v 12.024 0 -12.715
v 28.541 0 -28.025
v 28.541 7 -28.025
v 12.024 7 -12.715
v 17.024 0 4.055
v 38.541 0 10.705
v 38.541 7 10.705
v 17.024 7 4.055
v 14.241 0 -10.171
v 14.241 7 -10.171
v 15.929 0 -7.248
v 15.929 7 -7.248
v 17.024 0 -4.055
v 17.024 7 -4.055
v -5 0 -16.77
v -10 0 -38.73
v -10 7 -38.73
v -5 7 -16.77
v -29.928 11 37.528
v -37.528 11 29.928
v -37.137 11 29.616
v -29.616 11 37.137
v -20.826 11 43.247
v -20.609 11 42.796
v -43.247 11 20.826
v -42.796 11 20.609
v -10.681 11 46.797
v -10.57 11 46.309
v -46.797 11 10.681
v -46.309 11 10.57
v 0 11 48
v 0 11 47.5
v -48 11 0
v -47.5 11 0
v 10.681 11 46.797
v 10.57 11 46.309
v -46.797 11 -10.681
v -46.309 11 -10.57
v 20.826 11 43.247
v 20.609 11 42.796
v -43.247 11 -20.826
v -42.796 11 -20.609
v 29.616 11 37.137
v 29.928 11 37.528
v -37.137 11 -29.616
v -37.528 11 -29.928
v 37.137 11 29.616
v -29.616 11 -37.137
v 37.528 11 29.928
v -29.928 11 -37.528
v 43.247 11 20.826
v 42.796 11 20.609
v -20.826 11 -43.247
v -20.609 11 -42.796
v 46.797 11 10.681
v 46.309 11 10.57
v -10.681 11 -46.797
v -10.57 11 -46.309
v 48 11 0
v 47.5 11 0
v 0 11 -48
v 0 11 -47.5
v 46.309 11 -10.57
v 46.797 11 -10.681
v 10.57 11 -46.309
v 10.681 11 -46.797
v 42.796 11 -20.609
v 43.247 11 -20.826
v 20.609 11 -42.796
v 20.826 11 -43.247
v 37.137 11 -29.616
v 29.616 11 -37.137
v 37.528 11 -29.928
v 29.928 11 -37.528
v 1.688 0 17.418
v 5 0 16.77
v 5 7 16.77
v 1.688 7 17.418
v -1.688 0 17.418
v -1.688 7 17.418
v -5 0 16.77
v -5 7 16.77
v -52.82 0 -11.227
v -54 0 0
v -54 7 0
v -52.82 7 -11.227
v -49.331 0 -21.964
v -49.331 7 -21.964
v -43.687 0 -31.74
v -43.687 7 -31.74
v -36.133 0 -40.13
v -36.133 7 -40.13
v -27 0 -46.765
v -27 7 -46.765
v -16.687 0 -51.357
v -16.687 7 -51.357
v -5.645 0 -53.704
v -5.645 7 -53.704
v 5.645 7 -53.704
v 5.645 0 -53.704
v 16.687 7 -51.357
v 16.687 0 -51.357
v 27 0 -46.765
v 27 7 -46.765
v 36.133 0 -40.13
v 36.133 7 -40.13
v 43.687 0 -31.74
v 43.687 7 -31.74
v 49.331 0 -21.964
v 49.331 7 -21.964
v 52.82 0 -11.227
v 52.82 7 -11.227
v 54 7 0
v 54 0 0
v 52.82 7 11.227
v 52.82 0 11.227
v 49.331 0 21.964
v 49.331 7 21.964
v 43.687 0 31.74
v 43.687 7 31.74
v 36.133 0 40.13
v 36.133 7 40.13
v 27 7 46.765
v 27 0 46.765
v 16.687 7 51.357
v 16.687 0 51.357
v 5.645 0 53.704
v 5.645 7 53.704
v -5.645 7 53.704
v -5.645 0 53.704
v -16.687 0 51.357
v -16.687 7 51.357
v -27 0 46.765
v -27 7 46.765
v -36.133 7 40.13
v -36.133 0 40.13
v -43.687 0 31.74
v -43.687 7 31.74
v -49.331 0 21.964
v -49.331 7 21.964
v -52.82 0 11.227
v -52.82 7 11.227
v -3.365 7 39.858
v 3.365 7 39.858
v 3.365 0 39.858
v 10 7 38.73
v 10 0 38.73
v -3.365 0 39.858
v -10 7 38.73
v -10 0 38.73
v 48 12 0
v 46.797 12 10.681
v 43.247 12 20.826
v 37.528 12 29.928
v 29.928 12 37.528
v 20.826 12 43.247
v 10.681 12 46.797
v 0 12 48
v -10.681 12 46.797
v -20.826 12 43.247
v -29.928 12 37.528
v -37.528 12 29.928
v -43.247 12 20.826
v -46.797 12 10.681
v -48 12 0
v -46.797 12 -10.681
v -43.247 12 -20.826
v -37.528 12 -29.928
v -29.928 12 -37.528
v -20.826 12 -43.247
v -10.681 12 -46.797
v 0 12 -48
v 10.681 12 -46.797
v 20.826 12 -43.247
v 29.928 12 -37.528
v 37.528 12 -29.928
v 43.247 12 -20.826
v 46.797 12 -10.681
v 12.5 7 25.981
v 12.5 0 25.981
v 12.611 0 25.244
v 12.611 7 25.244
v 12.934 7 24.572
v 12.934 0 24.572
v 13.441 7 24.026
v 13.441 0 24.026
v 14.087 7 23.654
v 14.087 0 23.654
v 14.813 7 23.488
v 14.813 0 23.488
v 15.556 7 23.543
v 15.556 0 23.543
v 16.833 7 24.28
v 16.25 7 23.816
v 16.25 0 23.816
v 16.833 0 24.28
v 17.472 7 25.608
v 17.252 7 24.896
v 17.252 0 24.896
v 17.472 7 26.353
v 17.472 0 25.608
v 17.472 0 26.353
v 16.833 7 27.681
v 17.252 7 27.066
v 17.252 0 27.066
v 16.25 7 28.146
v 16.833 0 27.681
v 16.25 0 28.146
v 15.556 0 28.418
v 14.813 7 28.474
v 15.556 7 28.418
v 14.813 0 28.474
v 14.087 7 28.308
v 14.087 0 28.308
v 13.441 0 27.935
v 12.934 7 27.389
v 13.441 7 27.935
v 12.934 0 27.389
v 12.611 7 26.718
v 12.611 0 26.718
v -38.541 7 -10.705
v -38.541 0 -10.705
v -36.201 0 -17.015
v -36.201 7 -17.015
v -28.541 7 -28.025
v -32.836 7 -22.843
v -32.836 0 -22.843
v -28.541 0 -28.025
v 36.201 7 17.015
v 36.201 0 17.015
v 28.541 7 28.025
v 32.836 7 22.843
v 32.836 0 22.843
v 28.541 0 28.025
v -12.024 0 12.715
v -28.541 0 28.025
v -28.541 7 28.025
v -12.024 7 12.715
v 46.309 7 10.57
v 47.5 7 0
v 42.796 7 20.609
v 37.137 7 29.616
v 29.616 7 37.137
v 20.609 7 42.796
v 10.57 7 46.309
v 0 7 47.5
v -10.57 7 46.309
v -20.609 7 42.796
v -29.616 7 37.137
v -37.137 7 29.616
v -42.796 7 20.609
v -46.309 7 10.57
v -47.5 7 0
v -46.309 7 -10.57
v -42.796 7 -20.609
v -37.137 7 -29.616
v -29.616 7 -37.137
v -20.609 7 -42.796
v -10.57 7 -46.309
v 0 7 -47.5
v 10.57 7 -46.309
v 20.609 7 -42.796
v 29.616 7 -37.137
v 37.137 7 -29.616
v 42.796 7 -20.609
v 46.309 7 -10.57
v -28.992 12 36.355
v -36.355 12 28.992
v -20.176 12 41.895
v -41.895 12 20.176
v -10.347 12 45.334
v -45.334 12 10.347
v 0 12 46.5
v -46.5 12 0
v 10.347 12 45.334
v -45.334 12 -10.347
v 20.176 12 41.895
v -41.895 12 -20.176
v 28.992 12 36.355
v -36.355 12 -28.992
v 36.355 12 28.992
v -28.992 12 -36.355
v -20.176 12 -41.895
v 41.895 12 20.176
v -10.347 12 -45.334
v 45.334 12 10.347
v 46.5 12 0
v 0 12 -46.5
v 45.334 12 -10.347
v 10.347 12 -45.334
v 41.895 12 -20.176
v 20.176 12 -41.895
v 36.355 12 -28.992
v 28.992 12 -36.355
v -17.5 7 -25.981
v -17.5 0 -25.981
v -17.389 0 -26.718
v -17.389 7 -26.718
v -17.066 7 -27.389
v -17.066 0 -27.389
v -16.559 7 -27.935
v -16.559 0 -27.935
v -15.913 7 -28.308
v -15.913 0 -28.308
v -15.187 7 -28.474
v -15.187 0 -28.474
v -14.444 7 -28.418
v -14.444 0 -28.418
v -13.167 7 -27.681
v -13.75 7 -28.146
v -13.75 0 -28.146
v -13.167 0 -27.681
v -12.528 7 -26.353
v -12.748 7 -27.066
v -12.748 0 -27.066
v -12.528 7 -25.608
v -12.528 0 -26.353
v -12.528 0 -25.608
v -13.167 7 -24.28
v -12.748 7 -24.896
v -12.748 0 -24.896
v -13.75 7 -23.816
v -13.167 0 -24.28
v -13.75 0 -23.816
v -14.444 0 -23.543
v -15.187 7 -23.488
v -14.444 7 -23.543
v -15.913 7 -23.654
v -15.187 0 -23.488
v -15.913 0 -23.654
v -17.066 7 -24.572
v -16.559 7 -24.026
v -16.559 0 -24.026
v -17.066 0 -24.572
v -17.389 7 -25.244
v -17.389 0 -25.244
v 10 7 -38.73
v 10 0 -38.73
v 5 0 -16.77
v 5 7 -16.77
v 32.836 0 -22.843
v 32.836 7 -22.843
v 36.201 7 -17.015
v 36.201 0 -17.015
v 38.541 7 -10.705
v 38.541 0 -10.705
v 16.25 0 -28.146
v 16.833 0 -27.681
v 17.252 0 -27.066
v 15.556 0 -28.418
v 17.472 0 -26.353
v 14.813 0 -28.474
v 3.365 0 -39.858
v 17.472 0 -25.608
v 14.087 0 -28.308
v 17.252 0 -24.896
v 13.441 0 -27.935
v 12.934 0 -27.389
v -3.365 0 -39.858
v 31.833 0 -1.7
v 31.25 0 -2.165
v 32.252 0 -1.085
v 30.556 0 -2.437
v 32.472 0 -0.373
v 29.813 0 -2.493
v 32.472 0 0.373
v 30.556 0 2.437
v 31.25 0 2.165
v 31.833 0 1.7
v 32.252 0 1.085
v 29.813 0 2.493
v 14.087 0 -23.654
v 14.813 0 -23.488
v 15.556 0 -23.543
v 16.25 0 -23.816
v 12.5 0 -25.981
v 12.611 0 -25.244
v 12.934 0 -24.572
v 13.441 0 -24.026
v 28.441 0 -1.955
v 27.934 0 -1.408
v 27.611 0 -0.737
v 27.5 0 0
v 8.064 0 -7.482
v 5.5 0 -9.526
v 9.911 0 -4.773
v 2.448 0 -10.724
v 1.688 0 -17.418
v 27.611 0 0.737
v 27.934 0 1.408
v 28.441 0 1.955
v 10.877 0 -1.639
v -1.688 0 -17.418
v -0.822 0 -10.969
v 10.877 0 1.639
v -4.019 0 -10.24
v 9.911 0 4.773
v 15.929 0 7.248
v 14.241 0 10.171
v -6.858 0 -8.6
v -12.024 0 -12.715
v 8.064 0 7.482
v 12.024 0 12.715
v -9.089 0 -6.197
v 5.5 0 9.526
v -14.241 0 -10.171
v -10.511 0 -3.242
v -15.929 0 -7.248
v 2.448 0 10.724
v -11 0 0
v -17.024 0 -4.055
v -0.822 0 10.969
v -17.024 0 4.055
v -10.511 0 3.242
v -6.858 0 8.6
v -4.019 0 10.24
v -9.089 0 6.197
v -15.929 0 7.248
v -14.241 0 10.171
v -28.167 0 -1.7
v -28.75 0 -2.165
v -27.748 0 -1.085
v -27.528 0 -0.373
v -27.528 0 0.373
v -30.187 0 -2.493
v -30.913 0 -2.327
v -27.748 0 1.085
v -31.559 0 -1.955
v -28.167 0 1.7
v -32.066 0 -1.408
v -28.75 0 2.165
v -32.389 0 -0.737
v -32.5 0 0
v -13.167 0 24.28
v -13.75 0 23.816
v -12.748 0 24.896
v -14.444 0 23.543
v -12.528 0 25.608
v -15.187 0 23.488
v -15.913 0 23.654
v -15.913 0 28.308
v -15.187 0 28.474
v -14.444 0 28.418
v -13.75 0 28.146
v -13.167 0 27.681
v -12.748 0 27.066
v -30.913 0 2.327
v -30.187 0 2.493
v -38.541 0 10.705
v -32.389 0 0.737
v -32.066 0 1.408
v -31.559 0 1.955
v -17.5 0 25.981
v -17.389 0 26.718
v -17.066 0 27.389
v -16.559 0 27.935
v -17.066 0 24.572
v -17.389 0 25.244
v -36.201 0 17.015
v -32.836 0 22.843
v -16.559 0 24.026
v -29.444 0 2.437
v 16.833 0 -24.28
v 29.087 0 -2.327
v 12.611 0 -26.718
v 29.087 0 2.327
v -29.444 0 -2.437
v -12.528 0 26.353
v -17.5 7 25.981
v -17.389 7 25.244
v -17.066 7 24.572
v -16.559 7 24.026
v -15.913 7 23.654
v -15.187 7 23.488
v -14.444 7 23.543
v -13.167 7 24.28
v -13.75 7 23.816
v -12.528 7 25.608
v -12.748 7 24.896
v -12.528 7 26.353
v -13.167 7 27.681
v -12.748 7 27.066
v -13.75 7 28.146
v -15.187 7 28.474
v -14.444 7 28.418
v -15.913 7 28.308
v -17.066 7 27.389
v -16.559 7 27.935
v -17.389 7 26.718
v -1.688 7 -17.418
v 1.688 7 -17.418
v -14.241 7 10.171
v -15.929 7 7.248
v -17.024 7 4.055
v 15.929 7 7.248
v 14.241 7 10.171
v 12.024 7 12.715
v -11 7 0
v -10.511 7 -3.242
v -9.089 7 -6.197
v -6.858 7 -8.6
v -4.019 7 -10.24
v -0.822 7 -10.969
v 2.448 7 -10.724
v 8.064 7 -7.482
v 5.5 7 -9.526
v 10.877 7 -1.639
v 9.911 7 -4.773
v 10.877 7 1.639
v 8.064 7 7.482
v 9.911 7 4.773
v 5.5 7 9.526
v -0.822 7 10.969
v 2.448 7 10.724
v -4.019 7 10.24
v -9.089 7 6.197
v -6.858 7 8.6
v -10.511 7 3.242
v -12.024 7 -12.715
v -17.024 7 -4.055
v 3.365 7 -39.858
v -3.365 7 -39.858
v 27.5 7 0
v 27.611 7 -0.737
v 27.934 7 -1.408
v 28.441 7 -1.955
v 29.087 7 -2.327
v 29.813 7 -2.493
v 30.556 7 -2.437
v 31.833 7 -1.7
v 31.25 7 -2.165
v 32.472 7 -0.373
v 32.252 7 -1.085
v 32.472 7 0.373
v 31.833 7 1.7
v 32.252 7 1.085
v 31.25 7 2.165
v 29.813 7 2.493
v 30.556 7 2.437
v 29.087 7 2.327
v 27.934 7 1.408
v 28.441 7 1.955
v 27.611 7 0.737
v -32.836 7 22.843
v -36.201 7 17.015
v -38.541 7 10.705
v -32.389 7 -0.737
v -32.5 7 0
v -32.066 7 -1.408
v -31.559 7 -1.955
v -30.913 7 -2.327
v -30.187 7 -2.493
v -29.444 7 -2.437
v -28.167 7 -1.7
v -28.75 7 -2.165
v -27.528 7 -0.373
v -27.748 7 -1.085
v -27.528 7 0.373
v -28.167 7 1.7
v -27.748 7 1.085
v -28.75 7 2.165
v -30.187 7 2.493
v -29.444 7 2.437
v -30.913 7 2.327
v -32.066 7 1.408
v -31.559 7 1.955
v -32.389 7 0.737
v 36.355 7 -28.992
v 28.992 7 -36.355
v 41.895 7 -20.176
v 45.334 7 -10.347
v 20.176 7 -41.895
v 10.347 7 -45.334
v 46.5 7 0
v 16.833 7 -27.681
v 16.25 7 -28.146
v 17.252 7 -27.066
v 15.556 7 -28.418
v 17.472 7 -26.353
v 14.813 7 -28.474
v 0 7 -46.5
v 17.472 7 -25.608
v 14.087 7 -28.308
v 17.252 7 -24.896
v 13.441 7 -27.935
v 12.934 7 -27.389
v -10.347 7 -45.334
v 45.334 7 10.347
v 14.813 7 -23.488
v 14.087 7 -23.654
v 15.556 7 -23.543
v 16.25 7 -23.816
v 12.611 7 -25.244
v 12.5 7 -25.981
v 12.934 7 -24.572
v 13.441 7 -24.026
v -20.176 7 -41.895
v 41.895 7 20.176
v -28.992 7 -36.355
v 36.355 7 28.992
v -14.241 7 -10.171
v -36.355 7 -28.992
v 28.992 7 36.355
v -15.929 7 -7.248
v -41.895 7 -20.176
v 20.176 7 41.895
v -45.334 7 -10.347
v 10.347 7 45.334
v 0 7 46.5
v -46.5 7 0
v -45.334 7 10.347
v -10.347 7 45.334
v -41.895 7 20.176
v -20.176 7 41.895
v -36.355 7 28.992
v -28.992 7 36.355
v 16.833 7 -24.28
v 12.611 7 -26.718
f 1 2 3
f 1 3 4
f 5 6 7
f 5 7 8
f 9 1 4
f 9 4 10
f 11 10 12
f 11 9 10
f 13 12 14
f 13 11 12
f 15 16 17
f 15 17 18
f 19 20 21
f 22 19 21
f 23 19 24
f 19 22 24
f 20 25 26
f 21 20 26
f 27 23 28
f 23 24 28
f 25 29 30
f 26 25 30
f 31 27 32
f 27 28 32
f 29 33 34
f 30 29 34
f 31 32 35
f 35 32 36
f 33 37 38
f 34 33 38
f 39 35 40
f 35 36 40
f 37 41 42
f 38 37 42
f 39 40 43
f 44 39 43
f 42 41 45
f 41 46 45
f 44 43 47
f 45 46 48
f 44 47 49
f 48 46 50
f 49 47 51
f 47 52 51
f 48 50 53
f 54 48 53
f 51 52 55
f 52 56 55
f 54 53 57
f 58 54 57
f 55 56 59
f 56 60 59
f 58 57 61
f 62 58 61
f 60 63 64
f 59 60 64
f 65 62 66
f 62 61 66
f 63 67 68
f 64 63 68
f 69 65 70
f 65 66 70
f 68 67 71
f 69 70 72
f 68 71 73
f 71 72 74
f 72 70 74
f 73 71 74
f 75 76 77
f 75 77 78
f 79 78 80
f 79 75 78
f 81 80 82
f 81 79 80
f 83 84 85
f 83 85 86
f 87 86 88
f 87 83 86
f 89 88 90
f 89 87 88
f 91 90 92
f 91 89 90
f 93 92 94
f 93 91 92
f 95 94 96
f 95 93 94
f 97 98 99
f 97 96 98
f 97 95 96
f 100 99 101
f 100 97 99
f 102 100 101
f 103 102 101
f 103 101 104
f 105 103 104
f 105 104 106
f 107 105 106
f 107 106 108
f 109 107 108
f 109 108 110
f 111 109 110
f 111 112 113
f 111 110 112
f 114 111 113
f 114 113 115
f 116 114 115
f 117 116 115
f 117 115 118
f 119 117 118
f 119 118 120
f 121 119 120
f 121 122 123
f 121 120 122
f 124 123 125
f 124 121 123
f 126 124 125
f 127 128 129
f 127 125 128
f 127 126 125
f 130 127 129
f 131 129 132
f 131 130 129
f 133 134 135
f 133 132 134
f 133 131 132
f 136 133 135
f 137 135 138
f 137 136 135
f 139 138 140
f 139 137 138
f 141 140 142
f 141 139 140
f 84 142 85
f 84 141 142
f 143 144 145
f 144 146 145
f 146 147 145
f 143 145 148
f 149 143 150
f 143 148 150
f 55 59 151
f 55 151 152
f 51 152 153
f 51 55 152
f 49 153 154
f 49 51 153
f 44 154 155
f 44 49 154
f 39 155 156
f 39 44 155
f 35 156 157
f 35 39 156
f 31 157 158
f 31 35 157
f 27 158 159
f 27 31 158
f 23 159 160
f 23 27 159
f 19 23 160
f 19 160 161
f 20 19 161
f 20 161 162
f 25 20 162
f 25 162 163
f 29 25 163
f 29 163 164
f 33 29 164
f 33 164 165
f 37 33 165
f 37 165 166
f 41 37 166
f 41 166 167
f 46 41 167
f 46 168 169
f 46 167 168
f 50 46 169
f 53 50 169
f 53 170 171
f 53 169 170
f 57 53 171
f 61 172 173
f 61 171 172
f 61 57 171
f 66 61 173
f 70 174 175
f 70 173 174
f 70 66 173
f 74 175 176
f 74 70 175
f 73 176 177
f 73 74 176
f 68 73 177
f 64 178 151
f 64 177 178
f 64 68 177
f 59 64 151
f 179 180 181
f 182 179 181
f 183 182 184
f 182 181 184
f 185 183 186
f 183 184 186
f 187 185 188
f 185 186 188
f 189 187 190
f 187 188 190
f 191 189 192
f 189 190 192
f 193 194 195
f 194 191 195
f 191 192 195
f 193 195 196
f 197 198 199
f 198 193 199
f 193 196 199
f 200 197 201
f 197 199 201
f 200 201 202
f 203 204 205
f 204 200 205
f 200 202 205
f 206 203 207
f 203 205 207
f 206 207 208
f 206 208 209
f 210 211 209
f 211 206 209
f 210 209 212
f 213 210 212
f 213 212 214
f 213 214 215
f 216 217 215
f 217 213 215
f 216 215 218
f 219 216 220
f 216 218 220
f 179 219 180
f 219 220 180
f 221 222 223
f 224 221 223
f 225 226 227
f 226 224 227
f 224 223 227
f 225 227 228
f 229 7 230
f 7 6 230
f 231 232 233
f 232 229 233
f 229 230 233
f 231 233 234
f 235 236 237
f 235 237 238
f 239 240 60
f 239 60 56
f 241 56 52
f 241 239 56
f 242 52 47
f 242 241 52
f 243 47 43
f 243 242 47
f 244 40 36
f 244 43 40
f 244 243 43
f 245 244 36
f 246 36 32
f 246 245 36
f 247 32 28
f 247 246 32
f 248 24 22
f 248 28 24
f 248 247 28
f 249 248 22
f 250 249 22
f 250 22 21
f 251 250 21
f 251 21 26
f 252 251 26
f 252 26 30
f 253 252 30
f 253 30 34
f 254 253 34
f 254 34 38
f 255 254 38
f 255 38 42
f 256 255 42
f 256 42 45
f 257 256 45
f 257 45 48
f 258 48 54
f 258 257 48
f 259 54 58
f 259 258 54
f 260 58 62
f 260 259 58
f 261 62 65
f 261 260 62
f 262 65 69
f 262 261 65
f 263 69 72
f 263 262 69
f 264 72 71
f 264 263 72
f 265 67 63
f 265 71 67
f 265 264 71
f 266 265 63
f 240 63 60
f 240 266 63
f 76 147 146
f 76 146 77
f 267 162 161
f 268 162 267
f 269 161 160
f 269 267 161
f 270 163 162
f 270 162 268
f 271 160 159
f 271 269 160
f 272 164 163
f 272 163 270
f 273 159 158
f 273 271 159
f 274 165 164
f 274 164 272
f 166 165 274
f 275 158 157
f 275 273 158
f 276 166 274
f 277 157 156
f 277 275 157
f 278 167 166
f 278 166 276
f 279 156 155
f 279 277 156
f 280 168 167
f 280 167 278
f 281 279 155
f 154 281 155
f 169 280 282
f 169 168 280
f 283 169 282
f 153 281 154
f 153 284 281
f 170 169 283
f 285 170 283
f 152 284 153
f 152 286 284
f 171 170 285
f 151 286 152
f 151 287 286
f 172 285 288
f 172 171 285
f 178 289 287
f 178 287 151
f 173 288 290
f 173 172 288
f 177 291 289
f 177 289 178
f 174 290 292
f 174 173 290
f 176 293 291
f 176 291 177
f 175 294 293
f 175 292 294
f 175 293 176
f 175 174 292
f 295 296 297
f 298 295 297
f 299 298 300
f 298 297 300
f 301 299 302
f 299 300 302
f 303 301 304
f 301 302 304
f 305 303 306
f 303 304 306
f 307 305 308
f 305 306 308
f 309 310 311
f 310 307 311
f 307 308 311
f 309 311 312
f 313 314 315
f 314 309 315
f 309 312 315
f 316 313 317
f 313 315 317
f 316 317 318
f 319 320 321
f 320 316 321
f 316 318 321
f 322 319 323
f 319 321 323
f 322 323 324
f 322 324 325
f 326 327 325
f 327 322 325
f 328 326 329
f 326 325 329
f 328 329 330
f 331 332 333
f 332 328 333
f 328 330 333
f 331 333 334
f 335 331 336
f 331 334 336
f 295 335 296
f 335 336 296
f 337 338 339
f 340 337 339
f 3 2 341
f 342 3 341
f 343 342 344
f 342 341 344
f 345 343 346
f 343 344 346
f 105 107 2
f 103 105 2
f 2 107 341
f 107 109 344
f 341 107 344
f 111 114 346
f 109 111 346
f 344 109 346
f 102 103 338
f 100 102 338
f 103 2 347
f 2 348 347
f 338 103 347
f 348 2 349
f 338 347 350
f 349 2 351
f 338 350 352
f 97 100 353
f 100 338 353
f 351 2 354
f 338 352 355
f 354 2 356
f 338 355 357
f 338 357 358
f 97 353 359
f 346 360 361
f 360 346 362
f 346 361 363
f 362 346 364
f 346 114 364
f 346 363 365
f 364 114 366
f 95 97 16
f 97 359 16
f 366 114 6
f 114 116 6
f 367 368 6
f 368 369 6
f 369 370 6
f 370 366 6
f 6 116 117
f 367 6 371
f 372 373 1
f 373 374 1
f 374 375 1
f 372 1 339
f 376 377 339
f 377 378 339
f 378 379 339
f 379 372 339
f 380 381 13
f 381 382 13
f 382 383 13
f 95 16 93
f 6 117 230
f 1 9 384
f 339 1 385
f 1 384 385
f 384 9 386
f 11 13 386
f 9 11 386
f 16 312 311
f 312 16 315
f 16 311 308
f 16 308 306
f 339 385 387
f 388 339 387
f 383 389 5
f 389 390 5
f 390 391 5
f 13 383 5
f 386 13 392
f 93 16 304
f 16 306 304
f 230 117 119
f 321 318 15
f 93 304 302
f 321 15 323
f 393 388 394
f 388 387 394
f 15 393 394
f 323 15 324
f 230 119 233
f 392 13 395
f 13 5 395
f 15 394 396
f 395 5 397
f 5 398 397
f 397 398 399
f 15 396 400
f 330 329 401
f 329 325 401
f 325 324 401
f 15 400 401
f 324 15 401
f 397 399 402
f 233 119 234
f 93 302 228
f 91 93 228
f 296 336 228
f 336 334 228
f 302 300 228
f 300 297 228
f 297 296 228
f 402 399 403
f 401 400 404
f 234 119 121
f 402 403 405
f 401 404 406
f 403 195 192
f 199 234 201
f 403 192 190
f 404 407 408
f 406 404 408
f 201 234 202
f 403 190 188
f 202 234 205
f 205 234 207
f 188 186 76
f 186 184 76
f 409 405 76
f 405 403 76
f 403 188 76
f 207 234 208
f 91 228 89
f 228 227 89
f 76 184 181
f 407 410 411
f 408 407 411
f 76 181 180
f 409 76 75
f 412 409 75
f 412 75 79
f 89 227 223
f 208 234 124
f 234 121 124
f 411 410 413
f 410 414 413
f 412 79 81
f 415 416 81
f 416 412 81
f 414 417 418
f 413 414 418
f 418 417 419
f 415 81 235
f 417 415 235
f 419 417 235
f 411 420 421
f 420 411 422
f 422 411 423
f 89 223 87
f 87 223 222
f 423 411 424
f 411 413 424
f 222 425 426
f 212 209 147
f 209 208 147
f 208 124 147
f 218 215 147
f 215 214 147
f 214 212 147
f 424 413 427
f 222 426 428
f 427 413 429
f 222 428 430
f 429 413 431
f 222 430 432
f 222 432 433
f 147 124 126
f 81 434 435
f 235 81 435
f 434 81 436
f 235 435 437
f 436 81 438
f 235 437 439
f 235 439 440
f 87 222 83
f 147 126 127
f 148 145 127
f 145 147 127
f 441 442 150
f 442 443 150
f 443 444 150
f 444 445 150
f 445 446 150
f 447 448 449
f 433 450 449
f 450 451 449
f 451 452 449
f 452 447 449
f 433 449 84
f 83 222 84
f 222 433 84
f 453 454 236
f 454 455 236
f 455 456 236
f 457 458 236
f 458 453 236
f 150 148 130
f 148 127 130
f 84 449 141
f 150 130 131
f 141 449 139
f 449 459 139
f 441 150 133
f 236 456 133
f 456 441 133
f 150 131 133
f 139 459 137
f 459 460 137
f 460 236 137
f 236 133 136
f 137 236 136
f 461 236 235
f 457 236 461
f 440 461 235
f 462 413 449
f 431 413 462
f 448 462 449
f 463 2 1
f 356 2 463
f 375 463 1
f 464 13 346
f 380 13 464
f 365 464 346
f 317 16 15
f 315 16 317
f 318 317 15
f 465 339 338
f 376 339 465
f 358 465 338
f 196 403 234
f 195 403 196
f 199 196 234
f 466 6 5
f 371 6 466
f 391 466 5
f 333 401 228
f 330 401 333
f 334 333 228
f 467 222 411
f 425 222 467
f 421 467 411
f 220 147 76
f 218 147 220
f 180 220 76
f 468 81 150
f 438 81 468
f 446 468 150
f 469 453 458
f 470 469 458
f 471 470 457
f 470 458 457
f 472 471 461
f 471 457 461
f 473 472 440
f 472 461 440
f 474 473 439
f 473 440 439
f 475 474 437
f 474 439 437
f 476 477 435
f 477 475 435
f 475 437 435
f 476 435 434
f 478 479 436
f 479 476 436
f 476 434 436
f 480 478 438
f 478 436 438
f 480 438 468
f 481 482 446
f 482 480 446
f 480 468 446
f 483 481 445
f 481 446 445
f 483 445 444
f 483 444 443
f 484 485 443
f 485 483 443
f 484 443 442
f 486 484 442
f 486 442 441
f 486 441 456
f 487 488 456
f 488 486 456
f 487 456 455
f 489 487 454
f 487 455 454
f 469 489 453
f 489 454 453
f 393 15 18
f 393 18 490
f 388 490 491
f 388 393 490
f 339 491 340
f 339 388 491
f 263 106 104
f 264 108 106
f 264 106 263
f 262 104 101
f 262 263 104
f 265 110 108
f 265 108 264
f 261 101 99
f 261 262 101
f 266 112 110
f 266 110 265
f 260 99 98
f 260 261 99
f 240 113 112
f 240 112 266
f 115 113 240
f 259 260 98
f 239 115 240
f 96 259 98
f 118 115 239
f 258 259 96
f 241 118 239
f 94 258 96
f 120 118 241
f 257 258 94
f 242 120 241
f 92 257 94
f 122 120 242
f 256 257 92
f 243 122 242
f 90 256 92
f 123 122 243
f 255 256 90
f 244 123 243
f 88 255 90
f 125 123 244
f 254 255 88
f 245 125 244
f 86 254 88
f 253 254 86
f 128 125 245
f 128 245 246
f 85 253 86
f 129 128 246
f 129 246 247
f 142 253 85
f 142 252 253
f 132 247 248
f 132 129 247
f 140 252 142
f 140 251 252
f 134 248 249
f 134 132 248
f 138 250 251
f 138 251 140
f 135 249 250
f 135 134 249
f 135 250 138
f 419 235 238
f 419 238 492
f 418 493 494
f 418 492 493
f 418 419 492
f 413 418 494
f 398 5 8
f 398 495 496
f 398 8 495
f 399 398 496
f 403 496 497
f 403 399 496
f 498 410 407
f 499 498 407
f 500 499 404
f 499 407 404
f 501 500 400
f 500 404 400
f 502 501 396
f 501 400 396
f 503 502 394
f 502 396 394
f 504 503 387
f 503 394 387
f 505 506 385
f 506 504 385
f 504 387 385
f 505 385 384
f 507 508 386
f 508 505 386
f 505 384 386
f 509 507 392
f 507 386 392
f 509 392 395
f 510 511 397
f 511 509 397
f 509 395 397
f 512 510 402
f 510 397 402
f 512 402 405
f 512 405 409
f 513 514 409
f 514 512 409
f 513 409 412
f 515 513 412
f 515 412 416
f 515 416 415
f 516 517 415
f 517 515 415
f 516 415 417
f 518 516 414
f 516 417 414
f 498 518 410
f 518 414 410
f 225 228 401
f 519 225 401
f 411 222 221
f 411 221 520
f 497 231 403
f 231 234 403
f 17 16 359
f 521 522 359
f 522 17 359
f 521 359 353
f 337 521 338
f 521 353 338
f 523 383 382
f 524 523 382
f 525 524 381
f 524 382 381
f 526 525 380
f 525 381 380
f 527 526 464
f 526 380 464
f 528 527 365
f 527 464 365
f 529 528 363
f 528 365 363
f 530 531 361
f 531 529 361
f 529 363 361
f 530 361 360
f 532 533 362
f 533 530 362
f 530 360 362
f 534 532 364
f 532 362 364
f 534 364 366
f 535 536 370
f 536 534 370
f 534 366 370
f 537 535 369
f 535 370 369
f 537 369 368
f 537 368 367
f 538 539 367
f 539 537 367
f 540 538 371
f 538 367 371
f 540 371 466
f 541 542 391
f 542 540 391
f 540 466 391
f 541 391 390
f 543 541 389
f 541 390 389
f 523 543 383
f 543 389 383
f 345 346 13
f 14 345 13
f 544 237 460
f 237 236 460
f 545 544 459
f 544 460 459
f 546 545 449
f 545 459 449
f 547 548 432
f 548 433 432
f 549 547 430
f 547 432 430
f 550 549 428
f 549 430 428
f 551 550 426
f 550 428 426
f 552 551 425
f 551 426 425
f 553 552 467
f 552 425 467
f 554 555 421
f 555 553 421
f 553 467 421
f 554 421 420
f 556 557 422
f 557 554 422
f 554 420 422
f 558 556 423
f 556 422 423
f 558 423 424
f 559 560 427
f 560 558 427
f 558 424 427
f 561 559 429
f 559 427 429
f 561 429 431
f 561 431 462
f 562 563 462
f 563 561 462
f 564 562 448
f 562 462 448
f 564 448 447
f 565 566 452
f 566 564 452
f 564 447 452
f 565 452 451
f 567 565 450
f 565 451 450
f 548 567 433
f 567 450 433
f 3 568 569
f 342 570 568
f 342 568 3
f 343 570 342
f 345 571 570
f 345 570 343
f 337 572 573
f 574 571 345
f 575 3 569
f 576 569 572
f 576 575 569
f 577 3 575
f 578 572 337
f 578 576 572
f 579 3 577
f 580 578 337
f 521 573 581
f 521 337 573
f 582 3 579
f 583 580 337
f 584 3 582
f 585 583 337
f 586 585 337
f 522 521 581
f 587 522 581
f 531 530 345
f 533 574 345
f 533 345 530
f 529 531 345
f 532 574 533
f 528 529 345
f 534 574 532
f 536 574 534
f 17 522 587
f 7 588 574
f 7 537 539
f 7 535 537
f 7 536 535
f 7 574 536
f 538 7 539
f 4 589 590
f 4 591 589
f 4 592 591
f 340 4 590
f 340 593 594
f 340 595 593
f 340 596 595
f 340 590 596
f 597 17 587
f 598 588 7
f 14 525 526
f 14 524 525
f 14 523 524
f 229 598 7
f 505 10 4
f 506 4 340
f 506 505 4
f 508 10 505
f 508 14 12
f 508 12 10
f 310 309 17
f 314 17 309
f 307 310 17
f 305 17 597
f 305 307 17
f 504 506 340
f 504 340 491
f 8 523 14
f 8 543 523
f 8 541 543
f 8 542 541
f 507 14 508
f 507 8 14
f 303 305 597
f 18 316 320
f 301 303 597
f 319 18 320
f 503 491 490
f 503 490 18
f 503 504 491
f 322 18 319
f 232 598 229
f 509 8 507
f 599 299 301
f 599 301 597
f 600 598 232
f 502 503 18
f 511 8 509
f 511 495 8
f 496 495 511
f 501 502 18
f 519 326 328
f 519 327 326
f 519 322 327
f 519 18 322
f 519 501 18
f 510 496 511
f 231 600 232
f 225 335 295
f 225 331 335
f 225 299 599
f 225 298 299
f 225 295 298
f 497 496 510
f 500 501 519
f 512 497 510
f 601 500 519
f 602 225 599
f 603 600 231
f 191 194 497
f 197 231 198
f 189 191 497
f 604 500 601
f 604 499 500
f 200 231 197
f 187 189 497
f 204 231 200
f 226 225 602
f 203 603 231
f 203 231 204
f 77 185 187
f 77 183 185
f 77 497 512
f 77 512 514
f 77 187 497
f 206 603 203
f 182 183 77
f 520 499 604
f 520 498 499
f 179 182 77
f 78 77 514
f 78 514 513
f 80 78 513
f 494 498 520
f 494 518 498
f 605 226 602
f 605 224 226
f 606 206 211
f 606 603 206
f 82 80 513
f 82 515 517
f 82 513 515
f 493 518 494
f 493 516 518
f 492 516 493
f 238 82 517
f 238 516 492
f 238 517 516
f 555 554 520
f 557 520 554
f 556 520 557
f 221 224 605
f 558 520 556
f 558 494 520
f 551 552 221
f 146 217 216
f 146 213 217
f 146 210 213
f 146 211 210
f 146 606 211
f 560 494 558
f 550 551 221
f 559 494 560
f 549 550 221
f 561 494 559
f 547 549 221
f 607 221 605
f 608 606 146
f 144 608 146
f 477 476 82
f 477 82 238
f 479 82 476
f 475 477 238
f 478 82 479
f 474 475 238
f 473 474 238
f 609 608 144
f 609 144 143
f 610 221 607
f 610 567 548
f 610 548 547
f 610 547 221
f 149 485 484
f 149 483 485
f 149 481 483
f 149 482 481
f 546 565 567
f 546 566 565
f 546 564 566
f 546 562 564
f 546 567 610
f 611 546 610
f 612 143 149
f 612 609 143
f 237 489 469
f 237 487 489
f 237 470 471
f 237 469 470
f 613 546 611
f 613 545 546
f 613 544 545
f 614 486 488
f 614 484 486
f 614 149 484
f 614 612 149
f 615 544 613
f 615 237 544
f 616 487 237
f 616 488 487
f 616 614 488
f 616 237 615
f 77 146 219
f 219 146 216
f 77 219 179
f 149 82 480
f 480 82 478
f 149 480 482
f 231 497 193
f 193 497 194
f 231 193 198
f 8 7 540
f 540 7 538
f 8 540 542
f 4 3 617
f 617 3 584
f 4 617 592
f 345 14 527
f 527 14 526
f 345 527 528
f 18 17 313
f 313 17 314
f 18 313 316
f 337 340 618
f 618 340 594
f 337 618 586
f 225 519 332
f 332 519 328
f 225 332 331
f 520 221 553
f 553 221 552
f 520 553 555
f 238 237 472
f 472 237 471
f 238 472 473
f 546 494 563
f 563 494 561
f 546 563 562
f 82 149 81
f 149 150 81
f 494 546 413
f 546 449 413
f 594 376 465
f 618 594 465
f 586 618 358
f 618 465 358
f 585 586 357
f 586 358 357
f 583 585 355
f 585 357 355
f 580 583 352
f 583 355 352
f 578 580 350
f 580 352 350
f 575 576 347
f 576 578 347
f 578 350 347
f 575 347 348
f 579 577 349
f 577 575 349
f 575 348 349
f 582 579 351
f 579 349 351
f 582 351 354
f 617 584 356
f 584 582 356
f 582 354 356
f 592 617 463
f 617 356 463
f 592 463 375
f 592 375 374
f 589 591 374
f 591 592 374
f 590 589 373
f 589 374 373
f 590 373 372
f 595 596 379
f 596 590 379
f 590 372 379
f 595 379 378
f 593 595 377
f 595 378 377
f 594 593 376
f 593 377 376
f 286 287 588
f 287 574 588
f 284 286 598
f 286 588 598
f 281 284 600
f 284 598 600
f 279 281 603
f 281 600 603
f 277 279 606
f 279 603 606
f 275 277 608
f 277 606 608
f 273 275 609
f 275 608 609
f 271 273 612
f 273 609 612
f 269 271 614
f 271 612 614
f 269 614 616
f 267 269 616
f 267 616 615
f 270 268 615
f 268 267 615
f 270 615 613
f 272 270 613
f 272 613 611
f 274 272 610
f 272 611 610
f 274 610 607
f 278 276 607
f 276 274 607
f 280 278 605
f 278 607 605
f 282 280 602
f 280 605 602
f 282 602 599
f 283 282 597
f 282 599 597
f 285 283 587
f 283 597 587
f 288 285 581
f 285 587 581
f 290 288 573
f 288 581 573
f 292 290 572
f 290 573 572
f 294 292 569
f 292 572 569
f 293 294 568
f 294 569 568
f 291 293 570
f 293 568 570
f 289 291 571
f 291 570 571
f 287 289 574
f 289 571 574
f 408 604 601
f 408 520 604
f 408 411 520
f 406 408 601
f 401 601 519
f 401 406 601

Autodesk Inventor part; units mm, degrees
ref_plane "YZ Plane" through (0, 0, 0) normal (1, 0, 0) x (0, 1, 0)
ref_plane "XZ Plane" through (0, 0, 0) normal (0, 1, 0) x (-1, 0, 0)
ref_plane "XY Plane" through (0, 0, 0) normal (0, 0, 1) x (1, 0, 0)
sketch "Sketch3" plane through (0, 0, 0) normal (0, 1, 0) x (-1, 0, 0)
  circle A0 centre (0, 0) radius 11
  circle A1 centre (0, 0) radius 17.5 construction
  circle A2 centre (0, 0) radius 40 construction
  circle A3 centre (0, 0) radius 54
  line L0 (-10, 38.7298) -> (-5, 16.7705)
  line L1 (10, 38.7298) -> (5, 16.7705)
  arc A4 (10, 38.7298) -> (-10, 38.7298) centre (0, 0) ccw
  arc A5 (5, 16.7705) -> (-5, 16.7705) centre (0, 0) ccw
  circle A6 centre (0, 0) radius 30 construction
  line L2 (7.7787, 28.974) -> (21.2029, 21.2235) construction
  line L3 (14.4908, 25.0988) -> (15, 25.9808) construction
  circle A7 centre (15, 25.9808) radius 2.5
  circle A8 centre (-15, 25.9808) radius 2.5
  circle A9 centre (-30, 0) radius 2.5
  circle A10 centre (-15, -25.9808) radius 2.5
  circle A11 centre (15, -25.9808) radius 2.5
  circle A12 centre (30, 0) radius 2.5
  arc A13 (-28.541, 28.0252) -> (-38.541, 10.7047) centre (0, 0) ccw
  line L4 (-28.541, 28.0252) -> (-12.0237, 12.7154)
  line L5 (-38.541, 10.7047) -> (-17.0237, 4.0551)
  arc A14 (-12.0237, 12.7154) -> (-17.0237, 4.0551) centre (0, 0) ccw
  arc A15 (-38.541, -10.7047) -> (-28.541, -28.0252) centre (0, 0) ccw
  line L6 (-38.541, -10.7047) -> (-17.0237, -4.0551)
  line L7 (-28.541, -28.0252) -> (-12.0237, -12.7154)
  arc A16 (-17.0237, -4.0551) -> (-12.0237, -12.7154) centre (0, 0) ccw
  arc A17 (-10, -38.7298) -> (10, -38.7298) centre (0, 0) ccw
  line L8 (-10, -38.7298) -> (-5, -16.7705)
  line L9 (10, -38.7298) -> (5, -16.7705)
  arc A18 (-5, -16.7705) -> (5, -16.7705) centre (0, 0) ccw
  arc A19 (28.541, -28.0252) -> (38.541, -10.7047) centre (0, 0) ccw
  line L10 (28.541, -28.0252) -> (12.0237, -12.7154)
  line L11 (38.541, -10.7047) -> (17.0237, -4.0551)
  arc A20 (12.0237, -12.7154) -> (17.0237, -4.0551) centre (0, 0) ccw
  arc A21 (38.541, 10.7047) -> (28.541, 28.0252) centre (0, 0) ccw
  line L12 (38.541, 10.7047) -> (17.0237, 4.0551)
  line L13 (28.541, 28.0252) -> (12.0237, 12.7154)
  arc A22 (17.0237, 4.0551) -> (12.0237, 12.7154) centre (0, 0) ccw
  point P0 (-21.2029, 21.2235)
  point P1 (-28.9815, -7.7505)
  point P2 (-7.7787, -28.974)
  point P3 (21.2029, -21.2235)
  point P4 (28.9815, 7.7505)
  dimension "d16" = 22
  dimension "d17" = 35
  dimension "d18" = 80
  dimension "d19" = 108
  dimension "d20" = 10
  dimension "d21" = 5
  dimension "d22" = 10
  dimension "d23" = 5
  dimension "d28" = 60
  dimension "d29" = 5
  dimension "d32" = 360
  dimension "d38" = 360
extrude "Extrusion4" add sketch "Sketch3" along normal blind 7
sketch "Sketch4" plane through (0, 7, 0) normal (0, 1, 0) x (1, 0, 0)
  circle A0 centre (0, 0) radius 47.5
  circle A1 centre (0, 0) radius 46.5
  dimension "d42" = 95
  dimension "d43" = 93
extrude "Extrusion5" add sketch "Sketch4" along normal blind 4
sketch "Sketch6" plane through (0, 11, 0) normal (0, 1, 0) x (1, 0, 0)
  circle A0 centre (0, 0) radius 46.5 projected
  circle A1 centre (0, 0) radius 48
  dimension "d49" = 96
extrude "Extrusion7" add sketch "Sketch6" along normal blind 1
properties part number "Flexspline" material "ABS Plastic"
